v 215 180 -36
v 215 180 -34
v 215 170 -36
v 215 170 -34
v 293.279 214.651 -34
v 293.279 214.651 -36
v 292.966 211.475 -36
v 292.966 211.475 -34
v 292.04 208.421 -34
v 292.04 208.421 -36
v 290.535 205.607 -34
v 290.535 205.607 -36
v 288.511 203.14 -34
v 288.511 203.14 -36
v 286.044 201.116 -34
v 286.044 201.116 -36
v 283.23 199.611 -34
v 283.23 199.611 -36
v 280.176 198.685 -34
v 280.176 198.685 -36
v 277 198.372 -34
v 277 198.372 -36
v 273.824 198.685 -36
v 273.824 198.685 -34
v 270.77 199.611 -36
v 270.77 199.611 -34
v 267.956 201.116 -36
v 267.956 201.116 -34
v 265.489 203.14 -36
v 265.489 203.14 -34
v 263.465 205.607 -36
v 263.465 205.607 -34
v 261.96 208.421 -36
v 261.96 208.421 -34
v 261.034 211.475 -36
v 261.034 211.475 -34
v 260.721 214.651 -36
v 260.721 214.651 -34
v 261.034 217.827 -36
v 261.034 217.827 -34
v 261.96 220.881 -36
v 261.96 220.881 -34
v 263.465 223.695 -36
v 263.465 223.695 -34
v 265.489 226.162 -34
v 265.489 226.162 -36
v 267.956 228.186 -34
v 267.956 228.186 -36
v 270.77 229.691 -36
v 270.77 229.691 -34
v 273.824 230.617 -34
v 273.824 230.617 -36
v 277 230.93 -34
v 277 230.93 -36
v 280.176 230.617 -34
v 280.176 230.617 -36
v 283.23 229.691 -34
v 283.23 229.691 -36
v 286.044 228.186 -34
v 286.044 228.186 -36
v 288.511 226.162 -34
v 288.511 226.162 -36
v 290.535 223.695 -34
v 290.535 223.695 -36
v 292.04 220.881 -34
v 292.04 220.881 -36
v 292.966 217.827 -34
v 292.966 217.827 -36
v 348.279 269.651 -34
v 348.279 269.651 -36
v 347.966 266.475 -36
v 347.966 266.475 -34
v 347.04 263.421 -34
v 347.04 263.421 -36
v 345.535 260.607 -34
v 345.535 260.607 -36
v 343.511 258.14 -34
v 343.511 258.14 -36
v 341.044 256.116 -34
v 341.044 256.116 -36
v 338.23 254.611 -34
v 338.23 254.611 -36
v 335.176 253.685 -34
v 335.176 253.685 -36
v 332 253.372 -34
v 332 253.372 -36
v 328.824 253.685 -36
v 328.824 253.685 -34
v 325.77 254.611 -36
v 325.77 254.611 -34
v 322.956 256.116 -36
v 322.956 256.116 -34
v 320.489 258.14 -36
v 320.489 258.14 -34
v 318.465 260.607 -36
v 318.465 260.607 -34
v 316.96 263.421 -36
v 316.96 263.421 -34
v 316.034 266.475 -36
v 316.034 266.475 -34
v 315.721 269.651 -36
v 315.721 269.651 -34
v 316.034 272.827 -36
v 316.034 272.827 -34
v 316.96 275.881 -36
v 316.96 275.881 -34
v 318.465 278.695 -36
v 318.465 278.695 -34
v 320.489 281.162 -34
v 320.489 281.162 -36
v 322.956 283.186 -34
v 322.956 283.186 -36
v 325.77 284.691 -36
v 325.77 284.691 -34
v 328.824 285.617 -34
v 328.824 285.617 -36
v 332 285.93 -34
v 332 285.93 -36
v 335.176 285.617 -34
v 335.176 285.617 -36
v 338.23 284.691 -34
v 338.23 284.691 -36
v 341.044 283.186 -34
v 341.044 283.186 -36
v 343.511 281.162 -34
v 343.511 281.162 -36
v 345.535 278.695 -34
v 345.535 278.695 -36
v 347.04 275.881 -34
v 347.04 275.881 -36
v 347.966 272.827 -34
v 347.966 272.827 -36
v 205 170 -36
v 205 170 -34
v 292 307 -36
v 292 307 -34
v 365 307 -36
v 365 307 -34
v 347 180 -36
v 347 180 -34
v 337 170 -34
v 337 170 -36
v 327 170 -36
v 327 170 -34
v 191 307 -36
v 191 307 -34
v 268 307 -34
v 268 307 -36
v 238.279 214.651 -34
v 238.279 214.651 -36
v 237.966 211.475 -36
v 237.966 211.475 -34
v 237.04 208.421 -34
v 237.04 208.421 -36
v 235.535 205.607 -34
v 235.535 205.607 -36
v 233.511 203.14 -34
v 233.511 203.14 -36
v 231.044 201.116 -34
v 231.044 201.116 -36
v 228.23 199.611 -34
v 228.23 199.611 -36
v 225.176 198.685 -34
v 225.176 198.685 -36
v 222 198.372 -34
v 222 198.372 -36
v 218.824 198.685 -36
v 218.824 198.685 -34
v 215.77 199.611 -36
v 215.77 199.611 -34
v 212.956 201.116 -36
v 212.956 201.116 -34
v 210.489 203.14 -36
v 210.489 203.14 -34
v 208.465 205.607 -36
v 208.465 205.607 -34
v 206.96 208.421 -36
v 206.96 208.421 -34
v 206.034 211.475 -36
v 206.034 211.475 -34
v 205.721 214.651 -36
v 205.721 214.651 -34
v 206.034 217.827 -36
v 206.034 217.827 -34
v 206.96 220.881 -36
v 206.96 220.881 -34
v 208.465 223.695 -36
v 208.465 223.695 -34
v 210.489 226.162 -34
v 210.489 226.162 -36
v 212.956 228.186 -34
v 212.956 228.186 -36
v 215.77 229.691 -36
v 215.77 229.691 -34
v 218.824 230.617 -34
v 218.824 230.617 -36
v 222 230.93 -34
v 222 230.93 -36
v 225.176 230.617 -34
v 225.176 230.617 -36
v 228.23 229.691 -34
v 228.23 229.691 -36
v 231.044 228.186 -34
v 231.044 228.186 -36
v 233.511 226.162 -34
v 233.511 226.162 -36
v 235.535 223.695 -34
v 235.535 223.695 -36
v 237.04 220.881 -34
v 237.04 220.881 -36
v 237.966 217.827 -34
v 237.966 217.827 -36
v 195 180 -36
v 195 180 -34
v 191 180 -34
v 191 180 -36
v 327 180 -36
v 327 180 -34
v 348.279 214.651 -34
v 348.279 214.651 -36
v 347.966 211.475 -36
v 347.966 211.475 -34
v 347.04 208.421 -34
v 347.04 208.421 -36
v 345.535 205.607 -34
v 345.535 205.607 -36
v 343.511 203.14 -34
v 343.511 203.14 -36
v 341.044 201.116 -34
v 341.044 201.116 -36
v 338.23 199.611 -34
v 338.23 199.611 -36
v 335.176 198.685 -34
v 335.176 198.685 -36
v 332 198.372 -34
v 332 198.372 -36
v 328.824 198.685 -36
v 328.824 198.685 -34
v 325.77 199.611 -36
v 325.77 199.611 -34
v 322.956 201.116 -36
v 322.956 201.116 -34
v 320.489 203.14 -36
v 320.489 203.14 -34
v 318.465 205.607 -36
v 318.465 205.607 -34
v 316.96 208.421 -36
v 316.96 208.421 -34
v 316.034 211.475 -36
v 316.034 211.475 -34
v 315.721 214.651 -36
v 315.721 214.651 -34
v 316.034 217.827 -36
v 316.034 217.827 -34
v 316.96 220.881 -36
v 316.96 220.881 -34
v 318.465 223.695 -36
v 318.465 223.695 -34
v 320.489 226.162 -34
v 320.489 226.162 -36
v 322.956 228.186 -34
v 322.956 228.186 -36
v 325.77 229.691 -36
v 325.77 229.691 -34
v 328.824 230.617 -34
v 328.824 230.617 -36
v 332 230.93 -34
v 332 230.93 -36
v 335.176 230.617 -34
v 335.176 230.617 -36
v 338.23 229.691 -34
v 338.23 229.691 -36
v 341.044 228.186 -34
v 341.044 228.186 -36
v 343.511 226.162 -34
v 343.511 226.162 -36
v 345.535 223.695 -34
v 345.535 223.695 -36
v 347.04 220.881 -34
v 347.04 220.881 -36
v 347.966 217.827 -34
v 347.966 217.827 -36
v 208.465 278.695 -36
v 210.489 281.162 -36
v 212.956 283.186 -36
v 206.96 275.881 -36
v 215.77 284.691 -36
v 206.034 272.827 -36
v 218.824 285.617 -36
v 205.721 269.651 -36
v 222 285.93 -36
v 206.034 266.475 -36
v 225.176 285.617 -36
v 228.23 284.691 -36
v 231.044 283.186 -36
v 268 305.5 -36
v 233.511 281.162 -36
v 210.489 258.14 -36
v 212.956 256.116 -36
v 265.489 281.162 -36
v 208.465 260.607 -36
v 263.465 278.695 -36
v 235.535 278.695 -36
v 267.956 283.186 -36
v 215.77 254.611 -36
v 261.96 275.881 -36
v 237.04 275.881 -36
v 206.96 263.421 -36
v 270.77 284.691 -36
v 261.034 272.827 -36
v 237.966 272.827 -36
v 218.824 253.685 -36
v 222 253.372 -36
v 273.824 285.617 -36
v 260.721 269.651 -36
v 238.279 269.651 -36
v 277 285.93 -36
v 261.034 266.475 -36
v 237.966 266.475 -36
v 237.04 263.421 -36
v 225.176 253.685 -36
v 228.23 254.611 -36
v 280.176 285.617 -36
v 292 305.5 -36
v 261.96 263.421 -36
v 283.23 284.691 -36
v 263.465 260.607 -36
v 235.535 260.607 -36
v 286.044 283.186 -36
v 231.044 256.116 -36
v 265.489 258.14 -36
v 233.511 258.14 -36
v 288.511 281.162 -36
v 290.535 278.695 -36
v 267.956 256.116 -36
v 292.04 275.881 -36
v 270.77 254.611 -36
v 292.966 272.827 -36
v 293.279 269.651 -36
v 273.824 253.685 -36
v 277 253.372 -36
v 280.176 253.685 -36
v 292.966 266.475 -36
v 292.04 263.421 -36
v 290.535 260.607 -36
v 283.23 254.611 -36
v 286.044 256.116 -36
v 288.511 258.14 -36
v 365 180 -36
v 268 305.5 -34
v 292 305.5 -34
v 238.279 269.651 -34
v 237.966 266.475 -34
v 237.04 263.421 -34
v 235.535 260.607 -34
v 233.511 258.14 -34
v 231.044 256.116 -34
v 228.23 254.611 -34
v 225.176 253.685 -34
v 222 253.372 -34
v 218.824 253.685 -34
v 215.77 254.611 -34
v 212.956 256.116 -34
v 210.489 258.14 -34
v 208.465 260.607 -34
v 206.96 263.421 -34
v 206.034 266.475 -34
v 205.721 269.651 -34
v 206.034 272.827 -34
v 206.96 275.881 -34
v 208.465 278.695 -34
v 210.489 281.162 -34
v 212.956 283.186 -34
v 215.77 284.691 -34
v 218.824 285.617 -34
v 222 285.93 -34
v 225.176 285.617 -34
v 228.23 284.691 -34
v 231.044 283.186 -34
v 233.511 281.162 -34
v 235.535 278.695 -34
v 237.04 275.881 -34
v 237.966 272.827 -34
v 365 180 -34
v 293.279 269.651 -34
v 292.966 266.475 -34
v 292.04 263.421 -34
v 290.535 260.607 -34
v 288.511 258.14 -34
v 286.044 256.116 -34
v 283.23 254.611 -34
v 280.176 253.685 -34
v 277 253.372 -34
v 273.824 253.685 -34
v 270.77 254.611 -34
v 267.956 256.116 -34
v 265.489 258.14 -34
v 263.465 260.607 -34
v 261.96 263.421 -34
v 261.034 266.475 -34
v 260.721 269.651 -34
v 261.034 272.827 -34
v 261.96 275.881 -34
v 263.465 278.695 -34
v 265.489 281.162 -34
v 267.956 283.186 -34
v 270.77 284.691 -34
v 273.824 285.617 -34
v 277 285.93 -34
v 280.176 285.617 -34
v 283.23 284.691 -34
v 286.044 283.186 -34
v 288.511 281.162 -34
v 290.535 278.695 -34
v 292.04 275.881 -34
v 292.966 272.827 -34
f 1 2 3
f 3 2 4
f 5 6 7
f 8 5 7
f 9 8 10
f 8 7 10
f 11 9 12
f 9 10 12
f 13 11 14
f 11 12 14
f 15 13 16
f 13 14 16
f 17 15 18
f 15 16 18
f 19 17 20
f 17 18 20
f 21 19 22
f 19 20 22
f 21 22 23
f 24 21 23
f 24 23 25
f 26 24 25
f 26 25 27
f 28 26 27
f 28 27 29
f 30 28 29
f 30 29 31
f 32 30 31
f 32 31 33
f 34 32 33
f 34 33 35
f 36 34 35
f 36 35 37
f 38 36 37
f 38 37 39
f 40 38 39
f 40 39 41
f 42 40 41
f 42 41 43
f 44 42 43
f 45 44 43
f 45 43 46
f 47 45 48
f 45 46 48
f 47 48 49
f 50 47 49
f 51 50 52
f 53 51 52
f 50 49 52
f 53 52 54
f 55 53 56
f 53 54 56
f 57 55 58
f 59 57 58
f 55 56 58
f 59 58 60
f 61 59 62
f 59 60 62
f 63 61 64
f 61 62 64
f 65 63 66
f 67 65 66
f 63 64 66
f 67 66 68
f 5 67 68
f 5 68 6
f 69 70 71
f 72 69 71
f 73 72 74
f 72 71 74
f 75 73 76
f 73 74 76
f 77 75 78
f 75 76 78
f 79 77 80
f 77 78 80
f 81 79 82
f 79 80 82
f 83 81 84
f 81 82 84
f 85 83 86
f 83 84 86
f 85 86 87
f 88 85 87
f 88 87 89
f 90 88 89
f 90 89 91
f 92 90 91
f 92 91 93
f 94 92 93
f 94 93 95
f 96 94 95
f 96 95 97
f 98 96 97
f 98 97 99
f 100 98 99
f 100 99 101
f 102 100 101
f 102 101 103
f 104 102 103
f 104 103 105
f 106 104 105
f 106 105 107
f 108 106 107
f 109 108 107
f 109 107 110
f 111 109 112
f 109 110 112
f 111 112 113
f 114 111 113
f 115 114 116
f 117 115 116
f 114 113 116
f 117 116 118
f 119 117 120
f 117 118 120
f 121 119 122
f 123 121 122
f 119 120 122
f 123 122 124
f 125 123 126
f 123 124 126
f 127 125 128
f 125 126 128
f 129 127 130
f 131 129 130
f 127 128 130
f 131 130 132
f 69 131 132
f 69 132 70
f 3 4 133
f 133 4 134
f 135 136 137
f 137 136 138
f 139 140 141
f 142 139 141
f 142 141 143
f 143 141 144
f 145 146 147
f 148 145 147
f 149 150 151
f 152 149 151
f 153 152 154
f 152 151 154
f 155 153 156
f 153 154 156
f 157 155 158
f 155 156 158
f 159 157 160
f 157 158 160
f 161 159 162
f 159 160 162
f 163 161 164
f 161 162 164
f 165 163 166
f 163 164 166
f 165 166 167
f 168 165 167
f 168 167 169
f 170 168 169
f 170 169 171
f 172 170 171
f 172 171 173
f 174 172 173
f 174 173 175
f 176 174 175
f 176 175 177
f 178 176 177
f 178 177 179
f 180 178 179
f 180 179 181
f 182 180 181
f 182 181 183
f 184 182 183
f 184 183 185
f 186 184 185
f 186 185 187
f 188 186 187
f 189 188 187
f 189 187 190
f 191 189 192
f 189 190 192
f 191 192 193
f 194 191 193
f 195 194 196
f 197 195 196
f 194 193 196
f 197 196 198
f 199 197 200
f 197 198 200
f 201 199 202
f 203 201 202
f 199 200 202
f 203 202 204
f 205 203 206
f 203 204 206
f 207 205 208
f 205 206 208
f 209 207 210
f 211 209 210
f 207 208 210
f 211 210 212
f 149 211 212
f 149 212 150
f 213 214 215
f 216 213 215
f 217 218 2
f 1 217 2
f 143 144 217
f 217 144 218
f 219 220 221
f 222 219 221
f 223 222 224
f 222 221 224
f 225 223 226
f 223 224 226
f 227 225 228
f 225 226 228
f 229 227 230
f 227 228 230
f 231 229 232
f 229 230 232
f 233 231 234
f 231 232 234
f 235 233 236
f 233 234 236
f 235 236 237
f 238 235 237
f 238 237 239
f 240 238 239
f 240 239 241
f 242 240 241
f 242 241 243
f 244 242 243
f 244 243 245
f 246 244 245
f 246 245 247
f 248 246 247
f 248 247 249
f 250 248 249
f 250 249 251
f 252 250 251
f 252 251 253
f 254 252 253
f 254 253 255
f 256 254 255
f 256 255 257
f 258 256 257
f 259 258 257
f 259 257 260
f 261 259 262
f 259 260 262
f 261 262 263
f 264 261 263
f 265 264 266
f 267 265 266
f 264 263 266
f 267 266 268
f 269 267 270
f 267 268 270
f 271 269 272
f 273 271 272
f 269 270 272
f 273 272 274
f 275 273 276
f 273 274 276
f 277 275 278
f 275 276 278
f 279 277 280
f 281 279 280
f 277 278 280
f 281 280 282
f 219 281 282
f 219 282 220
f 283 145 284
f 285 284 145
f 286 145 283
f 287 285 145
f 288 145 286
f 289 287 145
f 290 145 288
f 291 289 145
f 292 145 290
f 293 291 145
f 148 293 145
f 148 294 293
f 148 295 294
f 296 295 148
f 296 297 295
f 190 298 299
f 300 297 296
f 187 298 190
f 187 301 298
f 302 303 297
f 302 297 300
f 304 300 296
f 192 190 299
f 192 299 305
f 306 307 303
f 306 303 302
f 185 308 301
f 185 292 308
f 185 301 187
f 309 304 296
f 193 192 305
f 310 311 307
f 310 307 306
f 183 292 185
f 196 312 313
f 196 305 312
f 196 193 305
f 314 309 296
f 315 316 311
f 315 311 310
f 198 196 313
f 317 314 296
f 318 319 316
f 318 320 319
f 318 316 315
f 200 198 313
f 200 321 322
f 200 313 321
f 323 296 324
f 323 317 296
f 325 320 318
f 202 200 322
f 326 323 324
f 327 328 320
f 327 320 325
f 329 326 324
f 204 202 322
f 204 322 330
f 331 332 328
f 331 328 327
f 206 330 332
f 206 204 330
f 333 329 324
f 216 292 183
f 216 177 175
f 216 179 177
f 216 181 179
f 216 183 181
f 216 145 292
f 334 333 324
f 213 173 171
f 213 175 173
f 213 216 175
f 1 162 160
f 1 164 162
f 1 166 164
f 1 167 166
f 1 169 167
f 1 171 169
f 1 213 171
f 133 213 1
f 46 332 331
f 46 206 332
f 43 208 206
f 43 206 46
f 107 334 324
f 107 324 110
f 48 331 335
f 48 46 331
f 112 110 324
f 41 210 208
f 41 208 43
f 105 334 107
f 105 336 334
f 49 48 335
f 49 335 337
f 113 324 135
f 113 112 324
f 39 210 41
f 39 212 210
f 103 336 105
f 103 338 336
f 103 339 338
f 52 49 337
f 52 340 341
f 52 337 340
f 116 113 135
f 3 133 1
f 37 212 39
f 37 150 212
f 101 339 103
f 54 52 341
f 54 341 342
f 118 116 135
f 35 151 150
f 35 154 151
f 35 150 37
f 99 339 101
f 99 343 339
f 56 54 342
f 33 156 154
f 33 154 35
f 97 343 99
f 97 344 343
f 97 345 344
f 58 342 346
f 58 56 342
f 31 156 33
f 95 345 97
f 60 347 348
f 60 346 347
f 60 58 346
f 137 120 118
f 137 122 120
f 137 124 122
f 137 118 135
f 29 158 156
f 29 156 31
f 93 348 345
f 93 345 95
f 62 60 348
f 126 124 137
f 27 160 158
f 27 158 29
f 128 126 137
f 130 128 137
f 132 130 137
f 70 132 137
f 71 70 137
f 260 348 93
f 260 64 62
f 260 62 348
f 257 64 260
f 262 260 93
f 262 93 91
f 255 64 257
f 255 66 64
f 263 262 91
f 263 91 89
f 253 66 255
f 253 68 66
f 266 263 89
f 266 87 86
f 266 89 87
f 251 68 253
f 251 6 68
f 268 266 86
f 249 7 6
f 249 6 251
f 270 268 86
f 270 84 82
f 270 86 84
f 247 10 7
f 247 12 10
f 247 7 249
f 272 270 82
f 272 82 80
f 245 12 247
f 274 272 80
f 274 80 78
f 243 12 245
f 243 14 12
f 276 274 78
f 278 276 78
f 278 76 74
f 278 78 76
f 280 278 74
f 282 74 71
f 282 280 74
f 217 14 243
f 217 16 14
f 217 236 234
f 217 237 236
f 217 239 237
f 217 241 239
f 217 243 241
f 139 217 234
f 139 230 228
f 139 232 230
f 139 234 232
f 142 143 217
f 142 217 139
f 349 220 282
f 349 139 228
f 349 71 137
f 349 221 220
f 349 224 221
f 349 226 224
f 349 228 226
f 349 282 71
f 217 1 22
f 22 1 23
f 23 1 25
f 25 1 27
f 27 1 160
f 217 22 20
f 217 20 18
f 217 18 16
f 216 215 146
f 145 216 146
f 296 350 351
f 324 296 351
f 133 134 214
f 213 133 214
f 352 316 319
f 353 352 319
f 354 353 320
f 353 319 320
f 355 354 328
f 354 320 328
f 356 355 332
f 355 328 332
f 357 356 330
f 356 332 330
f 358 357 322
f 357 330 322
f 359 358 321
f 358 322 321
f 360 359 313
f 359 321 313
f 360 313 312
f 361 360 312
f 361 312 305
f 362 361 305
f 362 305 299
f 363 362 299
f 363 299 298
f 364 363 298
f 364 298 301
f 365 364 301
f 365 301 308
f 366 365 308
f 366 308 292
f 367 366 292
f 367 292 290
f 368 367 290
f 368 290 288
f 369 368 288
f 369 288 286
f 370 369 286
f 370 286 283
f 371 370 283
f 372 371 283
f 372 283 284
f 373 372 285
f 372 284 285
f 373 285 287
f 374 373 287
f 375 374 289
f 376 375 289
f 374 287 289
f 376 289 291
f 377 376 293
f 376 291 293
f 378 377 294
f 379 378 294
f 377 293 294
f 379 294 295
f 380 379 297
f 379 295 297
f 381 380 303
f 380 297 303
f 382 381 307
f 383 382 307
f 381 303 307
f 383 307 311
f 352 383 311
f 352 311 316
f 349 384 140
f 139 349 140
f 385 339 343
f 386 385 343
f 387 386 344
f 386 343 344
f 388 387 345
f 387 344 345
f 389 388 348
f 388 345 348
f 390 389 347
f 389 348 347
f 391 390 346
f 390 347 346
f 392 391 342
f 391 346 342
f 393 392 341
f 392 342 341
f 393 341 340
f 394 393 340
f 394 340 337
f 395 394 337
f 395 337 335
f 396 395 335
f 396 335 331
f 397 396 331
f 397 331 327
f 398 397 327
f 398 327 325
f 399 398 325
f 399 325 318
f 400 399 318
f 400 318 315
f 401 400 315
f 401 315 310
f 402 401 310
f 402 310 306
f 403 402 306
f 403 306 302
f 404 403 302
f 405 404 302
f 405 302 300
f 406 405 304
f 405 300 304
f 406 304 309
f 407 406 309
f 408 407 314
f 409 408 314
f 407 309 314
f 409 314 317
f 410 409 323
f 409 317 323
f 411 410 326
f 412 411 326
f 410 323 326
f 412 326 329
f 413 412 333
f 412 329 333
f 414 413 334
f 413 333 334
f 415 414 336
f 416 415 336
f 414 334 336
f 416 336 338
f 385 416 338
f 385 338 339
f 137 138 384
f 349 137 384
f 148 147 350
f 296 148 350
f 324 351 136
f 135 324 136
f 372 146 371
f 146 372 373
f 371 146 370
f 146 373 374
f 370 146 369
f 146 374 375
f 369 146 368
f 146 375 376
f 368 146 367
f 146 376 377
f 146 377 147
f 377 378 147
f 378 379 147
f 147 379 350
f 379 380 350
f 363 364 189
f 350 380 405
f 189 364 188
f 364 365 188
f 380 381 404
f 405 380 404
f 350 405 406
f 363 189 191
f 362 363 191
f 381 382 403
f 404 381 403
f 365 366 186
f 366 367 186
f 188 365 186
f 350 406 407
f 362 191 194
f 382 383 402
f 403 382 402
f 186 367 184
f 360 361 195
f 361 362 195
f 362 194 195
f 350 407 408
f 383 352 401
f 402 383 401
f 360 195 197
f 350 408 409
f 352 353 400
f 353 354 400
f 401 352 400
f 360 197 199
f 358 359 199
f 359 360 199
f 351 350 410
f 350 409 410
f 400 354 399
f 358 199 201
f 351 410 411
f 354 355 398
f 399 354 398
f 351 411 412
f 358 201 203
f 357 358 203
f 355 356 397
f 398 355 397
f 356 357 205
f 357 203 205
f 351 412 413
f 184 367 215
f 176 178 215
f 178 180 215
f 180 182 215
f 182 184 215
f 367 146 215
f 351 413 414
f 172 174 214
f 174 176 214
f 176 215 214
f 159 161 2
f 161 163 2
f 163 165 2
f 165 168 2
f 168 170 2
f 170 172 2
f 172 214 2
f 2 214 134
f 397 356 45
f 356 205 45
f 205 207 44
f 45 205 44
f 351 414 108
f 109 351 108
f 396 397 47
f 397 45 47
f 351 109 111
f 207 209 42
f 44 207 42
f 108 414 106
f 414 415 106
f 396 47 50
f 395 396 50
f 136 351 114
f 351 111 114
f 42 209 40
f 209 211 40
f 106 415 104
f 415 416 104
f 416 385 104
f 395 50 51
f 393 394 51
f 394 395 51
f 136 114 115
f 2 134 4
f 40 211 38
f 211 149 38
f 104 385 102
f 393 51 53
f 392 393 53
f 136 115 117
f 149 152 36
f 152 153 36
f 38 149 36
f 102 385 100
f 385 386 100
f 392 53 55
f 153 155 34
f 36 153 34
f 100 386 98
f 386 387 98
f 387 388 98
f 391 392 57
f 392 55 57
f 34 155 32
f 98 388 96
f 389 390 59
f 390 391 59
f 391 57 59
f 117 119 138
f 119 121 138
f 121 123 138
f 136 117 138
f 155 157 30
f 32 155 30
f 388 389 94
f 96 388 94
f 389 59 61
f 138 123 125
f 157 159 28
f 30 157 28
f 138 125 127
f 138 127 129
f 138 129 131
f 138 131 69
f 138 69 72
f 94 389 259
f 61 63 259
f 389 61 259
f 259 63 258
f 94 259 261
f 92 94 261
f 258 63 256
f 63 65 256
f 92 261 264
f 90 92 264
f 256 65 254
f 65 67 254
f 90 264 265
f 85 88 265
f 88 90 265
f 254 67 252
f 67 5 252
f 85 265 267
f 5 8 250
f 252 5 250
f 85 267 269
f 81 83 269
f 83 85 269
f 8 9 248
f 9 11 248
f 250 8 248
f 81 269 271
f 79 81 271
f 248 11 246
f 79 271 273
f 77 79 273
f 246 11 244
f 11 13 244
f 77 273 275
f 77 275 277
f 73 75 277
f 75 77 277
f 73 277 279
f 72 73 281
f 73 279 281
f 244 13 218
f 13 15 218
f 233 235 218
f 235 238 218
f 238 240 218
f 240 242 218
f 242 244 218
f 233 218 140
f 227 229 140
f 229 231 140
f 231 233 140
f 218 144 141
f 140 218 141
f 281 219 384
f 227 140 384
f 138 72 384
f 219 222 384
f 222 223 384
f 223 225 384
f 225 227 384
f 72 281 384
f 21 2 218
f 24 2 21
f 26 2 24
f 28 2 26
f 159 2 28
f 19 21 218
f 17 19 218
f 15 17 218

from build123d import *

# Parameters (mm, degrees)
SKETCH162_R      = 16.278821
EXTRUDE144_DEPTH = 4
ARRAY_X_COUNT    = 3
ARRAY_X_PITCH    = 55
ARRAY_Y_COUNT    = 2
ARRAY_Y_PITCH    = 55
EXTRUDE129_DEPTH = 2


with BuildPart() as array:
    # Sketch162 → Extrude144 (new body)
    with BuildSketch(Plane(origin=(0, 0, -37), x_dir=(1, 0, 0), z_dir=(0, 0, -1))):
        with Locations((222, -214.650925)):
            Circle(SKETCH162_R)
    extrude(amount=-EXTRUDE144_DEPTH)

    # Array X: Array ×3


with BuildPart() as array_1:
    add(array.part)
    with Locations(*[(i * ARRAY_X_PITCH, 0, 0) for i in range(1, ARRAY_X_COUNT)]):
        add(array.part)

    # Array Y: Array ×2


with BuildPart() as array_2:
    add(array_1.part)
    with Locations(*[(0, i * ARRAY_Y_PITCH, 0) for i in range(1, ARRAY_Y_COUNT)]):
        add(array_1.part)


with BuildPart() as cut009:
    # Sketch141 → Extrude129 (new body)
    with BuildSketch(Plane(origin=(0, 0, -34), x_dir=(1, 0, 0), z_dir=(0, 0, -1))):
        Polygon((215, -170), (205, -170), (195, -180), (191, -180), (191, -307), (268, -307), (268, -305.5), (292, -305.5), (292, -307), (365, -307), (365, -180), (347, -180), (337, -170), (327, -170), (327, -180), (215, -180), align=None)
    extrude(amount=EXTRUDE129_DEPTH)

    # Cut009: cut Array
    add(array_2.part, mode=Mode.SUBTRACT)


solid = cut009.part
